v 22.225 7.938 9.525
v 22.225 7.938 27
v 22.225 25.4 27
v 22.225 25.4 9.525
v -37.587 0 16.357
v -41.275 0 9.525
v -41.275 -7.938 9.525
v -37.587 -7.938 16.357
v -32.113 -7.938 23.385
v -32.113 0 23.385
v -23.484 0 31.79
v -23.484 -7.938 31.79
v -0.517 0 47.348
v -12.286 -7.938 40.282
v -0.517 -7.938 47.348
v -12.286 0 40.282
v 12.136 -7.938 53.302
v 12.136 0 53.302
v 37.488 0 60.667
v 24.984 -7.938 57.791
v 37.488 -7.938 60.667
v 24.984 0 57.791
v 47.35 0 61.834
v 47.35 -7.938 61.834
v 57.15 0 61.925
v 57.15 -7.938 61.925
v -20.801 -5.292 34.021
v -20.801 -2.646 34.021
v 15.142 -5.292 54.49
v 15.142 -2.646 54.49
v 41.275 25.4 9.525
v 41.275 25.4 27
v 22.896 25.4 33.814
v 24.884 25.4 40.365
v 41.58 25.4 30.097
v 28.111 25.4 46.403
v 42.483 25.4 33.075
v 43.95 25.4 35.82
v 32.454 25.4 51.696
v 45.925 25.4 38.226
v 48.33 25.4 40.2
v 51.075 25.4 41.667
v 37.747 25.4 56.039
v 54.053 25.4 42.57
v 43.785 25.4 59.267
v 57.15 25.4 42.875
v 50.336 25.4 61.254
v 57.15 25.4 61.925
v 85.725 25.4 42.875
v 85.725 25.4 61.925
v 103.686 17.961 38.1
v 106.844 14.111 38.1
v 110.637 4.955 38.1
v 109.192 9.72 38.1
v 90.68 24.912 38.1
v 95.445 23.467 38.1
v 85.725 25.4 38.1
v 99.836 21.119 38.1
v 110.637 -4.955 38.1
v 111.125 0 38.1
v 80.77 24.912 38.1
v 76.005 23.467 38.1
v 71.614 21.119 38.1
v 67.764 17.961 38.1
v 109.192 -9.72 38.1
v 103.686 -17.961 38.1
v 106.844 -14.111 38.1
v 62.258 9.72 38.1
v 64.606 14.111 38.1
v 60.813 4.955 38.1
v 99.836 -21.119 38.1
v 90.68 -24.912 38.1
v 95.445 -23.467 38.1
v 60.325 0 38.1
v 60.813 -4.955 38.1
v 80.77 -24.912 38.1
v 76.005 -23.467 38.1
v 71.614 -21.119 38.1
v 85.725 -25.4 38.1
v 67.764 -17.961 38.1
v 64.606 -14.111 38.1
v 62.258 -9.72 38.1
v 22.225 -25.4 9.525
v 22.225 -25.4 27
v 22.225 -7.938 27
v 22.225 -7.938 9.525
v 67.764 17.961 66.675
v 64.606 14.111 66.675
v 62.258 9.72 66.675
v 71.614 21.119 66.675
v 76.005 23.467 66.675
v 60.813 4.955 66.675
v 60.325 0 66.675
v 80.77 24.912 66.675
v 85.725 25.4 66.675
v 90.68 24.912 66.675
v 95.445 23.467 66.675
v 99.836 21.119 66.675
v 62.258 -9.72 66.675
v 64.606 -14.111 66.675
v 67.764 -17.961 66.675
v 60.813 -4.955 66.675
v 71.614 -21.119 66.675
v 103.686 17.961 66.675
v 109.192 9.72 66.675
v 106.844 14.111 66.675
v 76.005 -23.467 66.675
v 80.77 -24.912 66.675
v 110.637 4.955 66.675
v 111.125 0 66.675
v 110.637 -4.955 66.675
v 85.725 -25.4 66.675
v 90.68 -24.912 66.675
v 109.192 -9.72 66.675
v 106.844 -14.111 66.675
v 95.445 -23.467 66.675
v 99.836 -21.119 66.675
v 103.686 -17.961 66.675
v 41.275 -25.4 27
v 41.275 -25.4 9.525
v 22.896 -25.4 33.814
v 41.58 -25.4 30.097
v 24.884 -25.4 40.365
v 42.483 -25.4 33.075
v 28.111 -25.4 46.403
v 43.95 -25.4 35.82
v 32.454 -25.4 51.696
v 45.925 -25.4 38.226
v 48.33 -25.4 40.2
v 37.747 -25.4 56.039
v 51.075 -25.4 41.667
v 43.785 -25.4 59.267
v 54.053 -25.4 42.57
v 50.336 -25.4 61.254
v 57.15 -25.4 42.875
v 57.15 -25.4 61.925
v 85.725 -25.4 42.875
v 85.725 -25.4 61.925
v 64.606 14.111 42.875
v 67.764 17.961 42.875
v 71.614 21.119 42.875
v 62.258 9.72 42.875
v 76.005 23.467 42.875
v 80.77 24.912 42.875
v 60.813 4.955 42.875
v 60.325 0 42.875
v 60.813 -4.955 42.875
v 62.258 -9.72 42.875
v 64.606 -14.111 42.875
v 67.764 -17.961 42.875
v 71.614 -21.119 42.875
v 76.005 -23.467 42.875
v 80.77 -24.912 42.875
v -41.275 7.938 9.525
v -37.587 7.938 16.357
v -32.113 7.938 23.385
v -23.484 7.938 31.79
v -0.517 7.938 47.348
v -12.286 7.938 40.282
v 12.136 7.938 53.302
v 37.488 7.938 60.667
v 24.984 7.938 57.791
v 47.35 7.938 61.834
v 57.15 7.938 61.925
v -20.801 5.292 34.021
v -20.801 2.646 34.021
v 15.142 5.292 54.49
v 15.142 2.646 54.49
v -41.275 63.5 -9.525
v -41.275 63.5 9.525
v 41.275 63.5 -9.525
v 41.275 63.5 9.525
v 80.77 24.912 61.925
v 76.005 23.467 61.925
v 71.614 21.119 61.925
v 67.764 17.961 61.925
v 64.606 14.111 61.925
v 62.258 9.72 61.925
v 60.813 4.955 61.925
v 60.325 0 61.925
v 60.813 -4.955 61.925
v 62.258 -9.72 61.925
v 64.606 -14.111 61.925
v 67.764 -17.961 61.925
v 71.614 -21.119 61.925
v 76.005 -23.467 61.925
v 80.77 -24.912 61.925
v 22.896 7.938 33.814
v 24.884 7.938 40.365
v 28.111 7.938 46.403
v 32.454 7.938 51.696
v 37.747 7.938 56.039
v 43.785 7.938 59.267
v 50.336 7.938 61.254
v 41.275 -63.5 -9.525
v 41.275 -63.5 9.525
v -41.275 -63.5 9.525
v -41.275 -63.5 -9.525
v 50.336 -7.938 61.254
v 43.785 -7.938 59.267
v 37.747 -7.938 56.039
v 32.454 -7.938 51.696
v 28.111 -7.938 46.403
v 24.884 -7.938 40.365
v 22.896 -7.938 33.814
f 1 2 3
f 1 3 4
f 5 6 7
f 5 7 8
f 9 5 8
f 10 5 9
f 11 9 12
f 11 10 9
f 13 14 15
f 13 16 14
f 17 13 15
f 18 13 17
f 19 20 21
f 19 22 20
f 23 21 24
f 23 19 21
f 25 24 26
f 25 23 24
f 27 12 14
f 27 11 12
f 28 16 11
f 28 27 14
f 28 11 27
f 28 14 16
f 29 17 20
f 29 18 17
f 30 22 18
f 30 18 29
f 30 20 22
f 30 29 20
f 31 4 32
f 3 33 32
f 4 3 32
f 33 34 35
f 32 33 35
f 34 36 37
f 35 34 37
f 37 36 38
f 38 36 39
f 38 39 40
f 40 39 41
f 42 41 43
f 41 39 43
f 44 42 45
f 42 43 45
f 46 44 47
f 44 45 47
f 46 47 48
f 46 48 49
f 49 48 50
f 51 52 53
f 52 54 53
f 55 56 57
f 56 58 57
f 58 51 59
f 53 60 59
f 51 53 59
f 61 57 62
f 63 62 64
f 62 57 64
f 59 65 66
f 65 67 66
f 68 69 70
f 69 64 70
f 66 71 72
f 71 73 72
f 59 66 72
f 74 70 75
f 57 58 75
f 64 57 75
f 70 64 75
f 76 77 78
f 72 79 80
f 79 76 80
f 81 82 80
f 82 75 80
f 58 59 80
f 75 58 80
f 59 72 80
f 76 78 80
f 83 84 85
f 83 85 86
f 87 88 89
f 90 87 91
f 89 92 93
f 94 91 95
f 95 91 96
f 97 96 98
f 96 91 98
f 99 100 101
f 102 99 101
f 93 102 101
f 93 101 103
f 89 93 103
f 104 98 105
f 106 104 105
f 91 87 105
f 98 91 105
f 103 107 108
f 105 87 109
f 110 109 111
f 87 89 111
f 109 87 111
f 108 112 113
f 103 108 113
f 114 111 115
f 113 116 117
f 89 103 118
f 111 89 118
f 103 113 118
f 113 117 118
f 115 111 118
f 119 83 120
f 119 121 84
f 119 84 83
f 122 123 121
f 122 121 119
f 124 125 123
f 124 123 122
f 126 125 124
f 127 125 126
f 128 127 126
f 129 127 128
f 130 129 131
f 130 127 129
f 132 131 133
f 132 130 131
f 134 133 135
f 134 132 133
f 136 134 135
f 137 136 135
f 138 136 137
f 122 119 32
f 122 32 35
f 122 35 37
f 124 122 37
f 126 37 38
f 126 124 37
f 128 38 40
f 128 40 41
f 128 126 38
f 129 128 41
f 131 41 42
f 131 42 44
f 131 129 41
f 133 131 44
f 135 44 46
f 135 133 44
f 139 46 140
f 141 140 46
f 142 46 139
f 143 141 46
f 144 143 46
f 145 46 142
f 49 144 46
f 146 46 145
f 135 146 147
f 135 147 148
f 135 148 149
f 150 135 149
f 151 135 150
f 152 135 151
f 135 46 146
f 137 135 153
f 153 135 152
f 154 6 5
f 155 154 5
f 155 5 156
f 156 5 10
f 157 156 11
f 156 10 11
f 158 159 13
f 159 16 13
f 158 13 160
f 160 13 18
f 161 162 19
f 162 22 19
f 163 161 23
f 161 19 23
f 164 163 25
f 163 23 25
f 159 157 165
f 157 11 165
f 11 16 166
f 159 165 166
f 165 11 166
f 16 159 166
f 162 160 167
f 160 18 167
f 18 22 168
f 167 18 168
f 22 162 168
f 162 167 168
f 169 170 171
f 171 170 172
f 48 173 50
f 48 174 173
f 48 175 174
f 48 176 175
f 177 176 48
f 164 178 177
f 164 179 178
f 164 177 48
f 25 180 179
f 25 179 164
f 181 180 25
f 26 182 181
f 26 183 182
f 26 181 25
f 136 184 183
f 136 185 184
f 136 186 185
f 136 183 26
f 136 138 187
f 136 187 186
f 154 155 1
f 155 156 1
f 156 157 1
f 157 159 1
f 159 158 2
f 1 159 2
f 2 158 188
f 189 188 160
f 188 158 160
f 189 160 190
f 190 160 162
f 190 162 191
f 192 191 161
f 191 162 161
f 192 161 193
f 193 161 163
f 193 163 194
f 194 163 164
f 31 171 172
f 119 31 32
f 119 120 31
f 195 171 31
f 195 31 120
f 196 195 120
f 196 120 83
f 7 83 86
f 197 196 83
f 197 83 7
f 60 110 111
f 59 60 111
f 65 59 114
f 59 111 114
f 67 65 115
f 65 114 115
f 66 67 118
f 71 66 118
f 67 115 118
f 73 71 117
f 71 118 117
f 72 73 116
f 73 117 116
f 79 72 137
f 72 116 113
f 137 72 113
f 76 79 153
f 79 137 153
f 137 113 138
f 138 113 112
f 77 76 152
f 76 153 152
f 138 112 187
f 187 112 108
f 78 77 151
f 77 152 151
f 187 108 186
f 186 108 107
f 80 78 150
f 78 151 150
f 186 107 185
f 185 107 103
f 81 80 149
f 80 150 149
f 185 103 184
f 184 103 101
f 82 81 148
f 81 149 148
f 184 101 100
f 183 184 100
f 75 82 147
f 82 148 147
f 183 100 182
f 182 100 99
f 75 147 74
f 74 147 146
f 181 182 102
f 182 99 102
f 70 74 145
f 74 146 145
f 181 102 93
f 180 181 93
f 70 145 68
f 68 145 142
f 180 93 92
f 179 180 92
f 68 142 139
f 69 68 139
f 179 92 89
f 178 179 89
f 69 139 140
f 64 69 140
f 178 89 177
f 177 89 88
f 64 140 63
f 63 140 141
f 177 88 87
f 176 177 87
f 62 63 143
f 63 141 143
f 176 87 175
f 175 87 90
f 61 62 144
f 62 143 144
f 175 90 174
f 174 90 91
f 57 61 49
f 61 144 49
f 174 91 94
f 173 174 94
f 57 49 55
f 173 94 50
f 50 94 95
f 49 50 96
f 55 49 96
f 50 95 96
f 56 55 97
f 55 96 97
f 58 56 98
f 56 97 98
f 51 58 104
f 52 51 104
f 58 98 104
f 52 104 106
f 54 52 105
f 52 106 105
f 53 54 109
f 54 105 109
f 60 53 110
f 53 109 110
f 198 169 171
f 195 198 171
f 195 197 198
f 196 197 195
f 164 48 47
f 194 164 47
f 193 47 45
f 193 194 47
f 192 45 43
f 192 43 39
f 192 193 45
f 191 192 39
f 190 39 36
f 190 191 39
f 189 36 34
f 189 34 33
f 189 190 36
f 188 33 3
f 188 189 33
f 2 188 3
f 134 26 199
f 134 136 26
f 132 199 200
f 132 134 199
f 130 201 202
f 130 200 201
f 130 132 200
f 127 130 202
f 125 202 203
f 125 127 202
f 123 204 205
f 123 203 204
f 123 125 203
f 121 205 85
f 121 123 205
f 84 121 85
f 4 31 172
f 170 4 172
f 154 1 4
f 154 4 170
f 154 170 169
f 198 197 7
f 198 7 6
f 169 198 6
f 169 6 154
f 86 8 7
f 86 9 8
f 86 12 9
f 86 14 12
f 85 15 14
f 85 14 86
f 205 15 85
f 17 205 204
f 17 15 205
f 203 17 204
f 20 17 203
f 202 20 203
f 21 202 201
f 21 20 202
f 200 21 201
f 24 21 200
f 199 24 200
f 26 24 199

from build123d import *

# Parameters (mm, degrees)
F1_DEPTH = 63.5
F0_W     = 25.4
F0_H     = 19.05
F2_DEPTH = 25.4
F3_DEPTH = 7.9375


with BuildPart() as f1:
    # F0 (on Front) → F1 (new body, symmetric)
    with BuildSketch(Plane.XZ):
        Polygon((41.275, -9.525), (41.275, 9.525), (22.225, 9.525), (-41.275, 9.525), (-41.275, -9.525), align=None)
    extrude(amount=F1_DEPTH, both=True)

    # F0 (on Front) → F2 (join, symmetric)
    with BuildSketch(Plane.XZ):
        with BuildLine():
            Line((22.225, 9.525), (41.275, 9.525))
            Line((41.275, 9.525), (41.275, 27.0002))
            ThreePointArc((41.275, 27.0002), (45.9246798487, 38.2255201513), (57.15, 42.8752))
            Line((57.15, 42.8752), (60.325, 42.8752))
            Line((60.325, 42.8752), (60.325, 61.9252))
            Line((60.325, 61.9252), (57.15, 61.9252))
            ThreePointArc((57.15, 61.9252), (32.4542956671, 51.6959043329), (22.225, 27.0002))
            Line((22.225, 27.0002), (22.225, 9.525))
        make_face()
        with Locations((73.025, 52.4002)):
            Rectangle(F0_W, F0_H)
    extrude(amount=F2_DEPTH, both=True)

    # F0 (on Front) → F3 (join, symmetric)
    with BuildSketch(Plane.XZ):
        with BuildLine():
            Line((-41.275, 9.525), (22.225, 9.525))
            Line((22.225, 9.525), (22.225, 27.0002))
            ThreePointArc((22.225, 27.0002), (32.4542956671, 51.6959043329), (57.15, 61.9252))
            add(Edge.make_bspline(
                [(-41.275, 9.525), (-31.6697917879, 33.0327823758), (15.2440918609, 64.0094131231), (57.15, 61.9252)],
                knots=[0, 0, 0, 0, 111.5045361635, 111.5045361635, 111.5045361635, 111.5045361635], degree=3))
        make_face()
    extrude(amount=F3_DEPTH, both=True)

    # F0 (on Front) → F4 (revolve)
    with BuildSketch(Plane.XZ):
        Polygon((85.725, 61.9252), (85.725, 42.8752), (85.725, 38.1), (111.125, 38.1), (111.125, 66.675), (85.725, 66.675), align=None)
    revolve(axis=Axis((85.725, 0, 52.3875), (0, 0, -1)))


solid = f1.part
